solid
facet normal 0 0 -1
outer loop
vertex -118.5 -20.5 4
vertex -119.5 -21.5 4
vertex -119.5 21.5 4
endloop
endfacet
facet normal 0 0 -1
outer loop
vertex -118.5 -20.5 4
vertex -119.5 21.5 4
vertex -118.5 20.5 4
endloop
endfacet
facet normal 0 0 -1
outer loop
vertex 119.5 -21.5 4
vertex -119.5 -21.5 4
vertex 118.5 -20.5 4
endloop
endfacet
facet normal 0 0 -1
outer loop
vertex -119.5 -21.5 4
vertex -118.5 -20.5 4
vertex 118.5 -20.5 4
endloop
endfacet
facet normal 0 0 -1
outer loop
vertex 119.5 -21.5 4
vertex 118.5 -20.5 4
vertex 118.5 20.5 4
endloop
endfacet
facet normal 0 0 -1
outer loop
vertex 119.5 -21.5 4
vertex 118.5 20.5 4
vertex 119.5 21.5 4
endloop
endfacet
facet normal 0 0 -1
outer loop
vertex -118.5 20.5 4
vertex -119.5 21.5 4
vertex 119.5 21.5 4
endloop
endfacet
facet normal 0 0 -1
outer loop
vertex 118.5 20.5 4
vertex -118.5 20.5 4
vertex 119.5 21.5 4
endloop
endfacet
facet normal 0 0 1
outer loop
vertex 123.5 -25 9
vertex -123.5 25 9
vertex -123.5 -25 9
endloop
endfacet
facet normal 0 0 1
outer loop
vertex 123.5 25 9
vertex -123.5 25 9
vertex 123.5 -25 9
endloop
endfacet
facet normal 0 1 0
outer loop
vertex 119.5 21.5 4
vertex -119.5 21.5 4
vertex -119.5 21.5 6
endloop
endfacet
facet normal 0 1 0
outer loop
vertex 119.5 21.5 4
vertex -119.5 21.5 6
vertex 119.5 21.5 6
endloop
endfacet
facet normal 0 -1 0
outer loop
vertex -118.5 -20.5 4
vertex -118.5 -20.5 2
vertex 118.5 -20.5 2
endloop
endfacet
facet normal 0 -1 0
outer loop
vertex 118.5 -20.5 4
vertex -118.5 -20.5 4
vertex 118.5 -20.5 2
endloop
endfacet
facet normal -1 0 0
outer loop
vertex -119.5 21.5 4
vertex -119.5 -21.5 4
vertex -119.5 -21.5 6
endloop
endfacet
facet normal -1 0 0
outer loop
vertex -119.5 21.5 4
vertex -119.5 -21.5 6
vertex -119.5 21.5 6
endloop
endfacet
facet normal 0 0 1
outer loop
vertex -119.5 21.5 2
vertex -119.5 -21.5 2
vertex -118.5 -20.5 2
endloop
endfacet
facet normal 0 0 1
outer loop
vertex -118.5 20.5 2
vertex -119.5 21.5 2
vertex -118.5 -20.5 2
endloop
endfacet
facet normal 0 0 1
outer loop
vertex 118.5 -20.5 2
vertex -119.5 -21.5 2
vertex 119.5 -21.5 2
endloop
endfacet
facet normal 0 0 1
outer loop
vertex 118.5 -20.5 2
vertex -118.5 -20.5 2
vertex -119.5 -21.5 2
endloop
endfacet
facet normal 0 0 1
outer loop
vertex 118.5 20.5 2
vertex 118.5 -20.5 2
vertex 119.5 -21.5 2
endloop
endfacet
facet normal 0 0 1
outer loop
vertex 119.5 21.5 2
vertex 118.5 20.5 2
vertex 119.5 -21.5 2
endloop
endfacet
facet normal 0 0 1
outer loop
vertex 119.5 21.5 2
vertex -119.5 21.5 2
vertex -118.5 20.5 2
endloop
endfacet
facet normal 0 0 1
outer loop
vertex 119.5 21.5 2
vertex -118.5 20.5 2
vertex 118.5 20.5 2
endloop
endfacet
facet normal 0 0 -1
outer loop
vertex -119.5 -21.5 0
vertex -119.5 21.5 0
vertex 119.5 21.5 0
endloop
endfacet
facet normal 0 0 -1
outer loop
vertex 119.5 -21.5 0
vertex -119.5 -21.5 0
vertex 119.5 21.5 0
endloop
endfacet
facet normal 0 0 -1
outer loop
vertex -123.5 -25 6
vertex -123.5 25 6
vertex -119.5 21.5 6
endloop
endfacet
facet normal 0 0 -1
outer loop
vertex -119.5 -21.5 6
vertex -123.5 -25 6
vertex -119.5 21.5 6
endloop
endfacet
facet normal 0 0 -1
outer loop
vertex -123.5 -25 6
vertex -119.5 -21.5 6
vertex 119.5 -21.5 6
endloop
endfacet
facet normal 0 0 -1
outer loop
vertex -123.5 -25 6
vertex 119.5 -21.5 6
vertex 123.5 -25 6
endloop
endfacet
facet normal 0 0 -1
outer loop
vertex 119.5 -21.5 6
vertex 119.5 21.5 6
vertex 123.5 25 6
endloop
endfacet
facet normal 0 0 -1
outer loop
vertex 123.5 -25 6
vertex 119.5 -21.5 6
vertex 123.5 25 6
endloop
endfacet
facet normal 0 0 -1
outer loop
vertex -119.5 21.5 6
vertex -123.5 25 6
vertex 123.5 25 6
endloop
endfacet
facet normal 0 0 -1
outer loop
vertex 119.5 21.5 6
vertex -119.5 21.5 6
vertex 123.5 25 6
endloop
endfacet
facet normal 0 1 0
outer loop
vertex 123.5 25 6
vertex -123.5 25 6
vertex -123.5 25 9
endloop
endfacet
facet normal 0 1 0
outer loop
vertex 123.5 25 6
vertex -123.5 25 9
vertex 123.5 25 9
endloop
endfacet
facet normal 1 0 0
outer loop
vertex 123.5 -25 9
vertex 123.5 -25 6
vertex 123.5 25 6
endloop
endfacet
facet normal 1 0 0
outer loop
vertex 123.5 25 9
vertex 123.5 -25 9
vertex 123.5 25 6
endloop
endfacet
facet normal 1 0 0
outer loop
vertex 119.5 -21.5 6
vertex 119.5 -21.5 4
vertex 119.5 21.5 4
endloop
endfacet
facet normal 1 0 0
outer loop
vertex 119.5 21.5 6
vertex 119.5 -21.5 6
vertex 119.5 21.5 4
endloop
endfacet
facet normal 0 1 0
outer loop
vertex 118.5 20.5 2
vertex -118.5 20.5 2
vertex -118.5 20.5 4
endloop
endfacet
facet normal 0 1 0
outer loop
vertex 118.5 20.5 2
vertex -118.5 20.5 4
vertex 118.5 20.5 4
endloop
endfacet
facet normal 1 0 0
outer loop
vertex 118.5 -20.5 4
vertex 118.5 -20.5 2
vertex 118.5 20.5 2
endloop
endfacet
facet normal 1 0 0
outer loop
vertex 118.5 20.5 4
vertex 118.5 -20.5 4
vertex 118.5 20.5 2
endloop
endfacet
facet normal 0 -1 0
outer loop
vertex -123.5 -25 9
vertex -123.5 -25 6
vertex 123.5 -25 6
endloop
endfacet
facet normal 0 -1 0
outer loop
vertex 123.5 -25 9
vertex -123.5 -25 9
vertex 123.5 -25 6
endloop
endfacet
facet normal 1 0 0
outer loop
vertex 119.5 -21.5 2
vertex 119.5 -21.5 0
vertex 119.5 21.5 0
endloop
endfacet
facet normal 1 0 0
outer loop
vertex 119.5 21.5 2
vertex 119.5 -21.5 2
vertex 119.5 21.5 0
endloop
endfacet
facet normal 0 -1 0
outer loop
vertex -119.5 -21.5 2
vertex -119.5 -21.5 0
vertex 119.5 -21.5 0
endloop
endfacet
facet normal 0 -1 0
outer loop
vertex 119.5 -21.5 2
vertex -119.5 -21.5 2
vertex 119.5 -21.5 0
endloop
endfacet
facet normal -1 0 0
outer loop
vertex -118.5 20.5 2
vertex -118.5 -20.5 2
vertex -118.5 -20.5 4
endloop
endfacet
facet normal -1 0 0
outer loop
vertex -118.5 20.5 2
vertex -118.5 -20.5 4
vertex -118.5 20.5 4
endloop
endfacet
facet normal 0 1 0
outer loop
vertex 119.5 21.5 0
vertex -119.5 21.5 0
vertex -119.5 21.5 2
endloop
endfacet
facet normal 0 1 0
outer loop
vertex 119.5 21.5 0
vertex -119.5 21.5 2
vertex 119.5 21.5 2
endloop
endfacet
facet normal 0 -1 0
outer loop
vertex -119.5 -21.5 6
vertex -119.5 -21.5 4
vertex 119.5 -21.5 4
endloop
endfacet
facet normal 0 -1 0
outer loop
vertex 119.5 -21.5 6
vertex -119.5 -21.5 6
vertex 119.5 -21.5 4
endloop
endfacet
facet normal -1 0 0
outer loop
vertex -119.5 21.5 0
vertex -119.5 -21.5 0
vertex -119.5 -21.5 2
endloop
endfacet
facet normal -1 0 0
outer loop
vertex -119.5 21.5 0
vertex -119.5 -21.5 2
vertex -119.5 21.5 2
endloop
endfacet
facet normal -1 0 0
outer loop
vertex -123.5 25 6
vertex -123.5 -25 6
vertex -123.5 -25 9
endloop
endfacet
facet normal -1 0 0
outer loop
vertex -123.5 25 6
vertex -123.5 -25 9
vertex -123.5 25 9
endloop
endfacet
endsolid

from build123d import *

# Parameters (mm, degrees)
F0_W     = 239
F0_H     = 43
F1_DEPTH = 2
F2_W     = 237
F2_H     = 41
F3_DEPTH = 2
F4_W     = 239
F4_H     = 43
F5_DEPTH = 2
F6_W     = 247
F6_H     = 50
F7_DEPTH = 3


with BuildPart() as f1:
    # F0 (on Top) → F1 (new body)
    with BuildSketch(Plane.XY):
        Rectangle(F0_W, F0_H)
    extrude(amount=F1_DEPTH)

    # F2 (on face) → F3 (join)
    with BuildSketch(Plane.XY.offset(2)):
        Rectangle(F2_W, F2_H)
    extrude(amount=F3_DEPTH)

    # F4 (on face) → F5 (join)
    with BuildSketch(Plane.XY.offset(4)):
        Rectangle(F4_W, F4_H)
    extrude(amount=F5_DEPTH)

    # F6 (on face) → F7 (join)
    with BuildSketch(Plane.XY.offset(6)):
        Rectangle(F6_W, F6_H)
    extrude(amount=F7_DEPTH)


solid = f1.part
